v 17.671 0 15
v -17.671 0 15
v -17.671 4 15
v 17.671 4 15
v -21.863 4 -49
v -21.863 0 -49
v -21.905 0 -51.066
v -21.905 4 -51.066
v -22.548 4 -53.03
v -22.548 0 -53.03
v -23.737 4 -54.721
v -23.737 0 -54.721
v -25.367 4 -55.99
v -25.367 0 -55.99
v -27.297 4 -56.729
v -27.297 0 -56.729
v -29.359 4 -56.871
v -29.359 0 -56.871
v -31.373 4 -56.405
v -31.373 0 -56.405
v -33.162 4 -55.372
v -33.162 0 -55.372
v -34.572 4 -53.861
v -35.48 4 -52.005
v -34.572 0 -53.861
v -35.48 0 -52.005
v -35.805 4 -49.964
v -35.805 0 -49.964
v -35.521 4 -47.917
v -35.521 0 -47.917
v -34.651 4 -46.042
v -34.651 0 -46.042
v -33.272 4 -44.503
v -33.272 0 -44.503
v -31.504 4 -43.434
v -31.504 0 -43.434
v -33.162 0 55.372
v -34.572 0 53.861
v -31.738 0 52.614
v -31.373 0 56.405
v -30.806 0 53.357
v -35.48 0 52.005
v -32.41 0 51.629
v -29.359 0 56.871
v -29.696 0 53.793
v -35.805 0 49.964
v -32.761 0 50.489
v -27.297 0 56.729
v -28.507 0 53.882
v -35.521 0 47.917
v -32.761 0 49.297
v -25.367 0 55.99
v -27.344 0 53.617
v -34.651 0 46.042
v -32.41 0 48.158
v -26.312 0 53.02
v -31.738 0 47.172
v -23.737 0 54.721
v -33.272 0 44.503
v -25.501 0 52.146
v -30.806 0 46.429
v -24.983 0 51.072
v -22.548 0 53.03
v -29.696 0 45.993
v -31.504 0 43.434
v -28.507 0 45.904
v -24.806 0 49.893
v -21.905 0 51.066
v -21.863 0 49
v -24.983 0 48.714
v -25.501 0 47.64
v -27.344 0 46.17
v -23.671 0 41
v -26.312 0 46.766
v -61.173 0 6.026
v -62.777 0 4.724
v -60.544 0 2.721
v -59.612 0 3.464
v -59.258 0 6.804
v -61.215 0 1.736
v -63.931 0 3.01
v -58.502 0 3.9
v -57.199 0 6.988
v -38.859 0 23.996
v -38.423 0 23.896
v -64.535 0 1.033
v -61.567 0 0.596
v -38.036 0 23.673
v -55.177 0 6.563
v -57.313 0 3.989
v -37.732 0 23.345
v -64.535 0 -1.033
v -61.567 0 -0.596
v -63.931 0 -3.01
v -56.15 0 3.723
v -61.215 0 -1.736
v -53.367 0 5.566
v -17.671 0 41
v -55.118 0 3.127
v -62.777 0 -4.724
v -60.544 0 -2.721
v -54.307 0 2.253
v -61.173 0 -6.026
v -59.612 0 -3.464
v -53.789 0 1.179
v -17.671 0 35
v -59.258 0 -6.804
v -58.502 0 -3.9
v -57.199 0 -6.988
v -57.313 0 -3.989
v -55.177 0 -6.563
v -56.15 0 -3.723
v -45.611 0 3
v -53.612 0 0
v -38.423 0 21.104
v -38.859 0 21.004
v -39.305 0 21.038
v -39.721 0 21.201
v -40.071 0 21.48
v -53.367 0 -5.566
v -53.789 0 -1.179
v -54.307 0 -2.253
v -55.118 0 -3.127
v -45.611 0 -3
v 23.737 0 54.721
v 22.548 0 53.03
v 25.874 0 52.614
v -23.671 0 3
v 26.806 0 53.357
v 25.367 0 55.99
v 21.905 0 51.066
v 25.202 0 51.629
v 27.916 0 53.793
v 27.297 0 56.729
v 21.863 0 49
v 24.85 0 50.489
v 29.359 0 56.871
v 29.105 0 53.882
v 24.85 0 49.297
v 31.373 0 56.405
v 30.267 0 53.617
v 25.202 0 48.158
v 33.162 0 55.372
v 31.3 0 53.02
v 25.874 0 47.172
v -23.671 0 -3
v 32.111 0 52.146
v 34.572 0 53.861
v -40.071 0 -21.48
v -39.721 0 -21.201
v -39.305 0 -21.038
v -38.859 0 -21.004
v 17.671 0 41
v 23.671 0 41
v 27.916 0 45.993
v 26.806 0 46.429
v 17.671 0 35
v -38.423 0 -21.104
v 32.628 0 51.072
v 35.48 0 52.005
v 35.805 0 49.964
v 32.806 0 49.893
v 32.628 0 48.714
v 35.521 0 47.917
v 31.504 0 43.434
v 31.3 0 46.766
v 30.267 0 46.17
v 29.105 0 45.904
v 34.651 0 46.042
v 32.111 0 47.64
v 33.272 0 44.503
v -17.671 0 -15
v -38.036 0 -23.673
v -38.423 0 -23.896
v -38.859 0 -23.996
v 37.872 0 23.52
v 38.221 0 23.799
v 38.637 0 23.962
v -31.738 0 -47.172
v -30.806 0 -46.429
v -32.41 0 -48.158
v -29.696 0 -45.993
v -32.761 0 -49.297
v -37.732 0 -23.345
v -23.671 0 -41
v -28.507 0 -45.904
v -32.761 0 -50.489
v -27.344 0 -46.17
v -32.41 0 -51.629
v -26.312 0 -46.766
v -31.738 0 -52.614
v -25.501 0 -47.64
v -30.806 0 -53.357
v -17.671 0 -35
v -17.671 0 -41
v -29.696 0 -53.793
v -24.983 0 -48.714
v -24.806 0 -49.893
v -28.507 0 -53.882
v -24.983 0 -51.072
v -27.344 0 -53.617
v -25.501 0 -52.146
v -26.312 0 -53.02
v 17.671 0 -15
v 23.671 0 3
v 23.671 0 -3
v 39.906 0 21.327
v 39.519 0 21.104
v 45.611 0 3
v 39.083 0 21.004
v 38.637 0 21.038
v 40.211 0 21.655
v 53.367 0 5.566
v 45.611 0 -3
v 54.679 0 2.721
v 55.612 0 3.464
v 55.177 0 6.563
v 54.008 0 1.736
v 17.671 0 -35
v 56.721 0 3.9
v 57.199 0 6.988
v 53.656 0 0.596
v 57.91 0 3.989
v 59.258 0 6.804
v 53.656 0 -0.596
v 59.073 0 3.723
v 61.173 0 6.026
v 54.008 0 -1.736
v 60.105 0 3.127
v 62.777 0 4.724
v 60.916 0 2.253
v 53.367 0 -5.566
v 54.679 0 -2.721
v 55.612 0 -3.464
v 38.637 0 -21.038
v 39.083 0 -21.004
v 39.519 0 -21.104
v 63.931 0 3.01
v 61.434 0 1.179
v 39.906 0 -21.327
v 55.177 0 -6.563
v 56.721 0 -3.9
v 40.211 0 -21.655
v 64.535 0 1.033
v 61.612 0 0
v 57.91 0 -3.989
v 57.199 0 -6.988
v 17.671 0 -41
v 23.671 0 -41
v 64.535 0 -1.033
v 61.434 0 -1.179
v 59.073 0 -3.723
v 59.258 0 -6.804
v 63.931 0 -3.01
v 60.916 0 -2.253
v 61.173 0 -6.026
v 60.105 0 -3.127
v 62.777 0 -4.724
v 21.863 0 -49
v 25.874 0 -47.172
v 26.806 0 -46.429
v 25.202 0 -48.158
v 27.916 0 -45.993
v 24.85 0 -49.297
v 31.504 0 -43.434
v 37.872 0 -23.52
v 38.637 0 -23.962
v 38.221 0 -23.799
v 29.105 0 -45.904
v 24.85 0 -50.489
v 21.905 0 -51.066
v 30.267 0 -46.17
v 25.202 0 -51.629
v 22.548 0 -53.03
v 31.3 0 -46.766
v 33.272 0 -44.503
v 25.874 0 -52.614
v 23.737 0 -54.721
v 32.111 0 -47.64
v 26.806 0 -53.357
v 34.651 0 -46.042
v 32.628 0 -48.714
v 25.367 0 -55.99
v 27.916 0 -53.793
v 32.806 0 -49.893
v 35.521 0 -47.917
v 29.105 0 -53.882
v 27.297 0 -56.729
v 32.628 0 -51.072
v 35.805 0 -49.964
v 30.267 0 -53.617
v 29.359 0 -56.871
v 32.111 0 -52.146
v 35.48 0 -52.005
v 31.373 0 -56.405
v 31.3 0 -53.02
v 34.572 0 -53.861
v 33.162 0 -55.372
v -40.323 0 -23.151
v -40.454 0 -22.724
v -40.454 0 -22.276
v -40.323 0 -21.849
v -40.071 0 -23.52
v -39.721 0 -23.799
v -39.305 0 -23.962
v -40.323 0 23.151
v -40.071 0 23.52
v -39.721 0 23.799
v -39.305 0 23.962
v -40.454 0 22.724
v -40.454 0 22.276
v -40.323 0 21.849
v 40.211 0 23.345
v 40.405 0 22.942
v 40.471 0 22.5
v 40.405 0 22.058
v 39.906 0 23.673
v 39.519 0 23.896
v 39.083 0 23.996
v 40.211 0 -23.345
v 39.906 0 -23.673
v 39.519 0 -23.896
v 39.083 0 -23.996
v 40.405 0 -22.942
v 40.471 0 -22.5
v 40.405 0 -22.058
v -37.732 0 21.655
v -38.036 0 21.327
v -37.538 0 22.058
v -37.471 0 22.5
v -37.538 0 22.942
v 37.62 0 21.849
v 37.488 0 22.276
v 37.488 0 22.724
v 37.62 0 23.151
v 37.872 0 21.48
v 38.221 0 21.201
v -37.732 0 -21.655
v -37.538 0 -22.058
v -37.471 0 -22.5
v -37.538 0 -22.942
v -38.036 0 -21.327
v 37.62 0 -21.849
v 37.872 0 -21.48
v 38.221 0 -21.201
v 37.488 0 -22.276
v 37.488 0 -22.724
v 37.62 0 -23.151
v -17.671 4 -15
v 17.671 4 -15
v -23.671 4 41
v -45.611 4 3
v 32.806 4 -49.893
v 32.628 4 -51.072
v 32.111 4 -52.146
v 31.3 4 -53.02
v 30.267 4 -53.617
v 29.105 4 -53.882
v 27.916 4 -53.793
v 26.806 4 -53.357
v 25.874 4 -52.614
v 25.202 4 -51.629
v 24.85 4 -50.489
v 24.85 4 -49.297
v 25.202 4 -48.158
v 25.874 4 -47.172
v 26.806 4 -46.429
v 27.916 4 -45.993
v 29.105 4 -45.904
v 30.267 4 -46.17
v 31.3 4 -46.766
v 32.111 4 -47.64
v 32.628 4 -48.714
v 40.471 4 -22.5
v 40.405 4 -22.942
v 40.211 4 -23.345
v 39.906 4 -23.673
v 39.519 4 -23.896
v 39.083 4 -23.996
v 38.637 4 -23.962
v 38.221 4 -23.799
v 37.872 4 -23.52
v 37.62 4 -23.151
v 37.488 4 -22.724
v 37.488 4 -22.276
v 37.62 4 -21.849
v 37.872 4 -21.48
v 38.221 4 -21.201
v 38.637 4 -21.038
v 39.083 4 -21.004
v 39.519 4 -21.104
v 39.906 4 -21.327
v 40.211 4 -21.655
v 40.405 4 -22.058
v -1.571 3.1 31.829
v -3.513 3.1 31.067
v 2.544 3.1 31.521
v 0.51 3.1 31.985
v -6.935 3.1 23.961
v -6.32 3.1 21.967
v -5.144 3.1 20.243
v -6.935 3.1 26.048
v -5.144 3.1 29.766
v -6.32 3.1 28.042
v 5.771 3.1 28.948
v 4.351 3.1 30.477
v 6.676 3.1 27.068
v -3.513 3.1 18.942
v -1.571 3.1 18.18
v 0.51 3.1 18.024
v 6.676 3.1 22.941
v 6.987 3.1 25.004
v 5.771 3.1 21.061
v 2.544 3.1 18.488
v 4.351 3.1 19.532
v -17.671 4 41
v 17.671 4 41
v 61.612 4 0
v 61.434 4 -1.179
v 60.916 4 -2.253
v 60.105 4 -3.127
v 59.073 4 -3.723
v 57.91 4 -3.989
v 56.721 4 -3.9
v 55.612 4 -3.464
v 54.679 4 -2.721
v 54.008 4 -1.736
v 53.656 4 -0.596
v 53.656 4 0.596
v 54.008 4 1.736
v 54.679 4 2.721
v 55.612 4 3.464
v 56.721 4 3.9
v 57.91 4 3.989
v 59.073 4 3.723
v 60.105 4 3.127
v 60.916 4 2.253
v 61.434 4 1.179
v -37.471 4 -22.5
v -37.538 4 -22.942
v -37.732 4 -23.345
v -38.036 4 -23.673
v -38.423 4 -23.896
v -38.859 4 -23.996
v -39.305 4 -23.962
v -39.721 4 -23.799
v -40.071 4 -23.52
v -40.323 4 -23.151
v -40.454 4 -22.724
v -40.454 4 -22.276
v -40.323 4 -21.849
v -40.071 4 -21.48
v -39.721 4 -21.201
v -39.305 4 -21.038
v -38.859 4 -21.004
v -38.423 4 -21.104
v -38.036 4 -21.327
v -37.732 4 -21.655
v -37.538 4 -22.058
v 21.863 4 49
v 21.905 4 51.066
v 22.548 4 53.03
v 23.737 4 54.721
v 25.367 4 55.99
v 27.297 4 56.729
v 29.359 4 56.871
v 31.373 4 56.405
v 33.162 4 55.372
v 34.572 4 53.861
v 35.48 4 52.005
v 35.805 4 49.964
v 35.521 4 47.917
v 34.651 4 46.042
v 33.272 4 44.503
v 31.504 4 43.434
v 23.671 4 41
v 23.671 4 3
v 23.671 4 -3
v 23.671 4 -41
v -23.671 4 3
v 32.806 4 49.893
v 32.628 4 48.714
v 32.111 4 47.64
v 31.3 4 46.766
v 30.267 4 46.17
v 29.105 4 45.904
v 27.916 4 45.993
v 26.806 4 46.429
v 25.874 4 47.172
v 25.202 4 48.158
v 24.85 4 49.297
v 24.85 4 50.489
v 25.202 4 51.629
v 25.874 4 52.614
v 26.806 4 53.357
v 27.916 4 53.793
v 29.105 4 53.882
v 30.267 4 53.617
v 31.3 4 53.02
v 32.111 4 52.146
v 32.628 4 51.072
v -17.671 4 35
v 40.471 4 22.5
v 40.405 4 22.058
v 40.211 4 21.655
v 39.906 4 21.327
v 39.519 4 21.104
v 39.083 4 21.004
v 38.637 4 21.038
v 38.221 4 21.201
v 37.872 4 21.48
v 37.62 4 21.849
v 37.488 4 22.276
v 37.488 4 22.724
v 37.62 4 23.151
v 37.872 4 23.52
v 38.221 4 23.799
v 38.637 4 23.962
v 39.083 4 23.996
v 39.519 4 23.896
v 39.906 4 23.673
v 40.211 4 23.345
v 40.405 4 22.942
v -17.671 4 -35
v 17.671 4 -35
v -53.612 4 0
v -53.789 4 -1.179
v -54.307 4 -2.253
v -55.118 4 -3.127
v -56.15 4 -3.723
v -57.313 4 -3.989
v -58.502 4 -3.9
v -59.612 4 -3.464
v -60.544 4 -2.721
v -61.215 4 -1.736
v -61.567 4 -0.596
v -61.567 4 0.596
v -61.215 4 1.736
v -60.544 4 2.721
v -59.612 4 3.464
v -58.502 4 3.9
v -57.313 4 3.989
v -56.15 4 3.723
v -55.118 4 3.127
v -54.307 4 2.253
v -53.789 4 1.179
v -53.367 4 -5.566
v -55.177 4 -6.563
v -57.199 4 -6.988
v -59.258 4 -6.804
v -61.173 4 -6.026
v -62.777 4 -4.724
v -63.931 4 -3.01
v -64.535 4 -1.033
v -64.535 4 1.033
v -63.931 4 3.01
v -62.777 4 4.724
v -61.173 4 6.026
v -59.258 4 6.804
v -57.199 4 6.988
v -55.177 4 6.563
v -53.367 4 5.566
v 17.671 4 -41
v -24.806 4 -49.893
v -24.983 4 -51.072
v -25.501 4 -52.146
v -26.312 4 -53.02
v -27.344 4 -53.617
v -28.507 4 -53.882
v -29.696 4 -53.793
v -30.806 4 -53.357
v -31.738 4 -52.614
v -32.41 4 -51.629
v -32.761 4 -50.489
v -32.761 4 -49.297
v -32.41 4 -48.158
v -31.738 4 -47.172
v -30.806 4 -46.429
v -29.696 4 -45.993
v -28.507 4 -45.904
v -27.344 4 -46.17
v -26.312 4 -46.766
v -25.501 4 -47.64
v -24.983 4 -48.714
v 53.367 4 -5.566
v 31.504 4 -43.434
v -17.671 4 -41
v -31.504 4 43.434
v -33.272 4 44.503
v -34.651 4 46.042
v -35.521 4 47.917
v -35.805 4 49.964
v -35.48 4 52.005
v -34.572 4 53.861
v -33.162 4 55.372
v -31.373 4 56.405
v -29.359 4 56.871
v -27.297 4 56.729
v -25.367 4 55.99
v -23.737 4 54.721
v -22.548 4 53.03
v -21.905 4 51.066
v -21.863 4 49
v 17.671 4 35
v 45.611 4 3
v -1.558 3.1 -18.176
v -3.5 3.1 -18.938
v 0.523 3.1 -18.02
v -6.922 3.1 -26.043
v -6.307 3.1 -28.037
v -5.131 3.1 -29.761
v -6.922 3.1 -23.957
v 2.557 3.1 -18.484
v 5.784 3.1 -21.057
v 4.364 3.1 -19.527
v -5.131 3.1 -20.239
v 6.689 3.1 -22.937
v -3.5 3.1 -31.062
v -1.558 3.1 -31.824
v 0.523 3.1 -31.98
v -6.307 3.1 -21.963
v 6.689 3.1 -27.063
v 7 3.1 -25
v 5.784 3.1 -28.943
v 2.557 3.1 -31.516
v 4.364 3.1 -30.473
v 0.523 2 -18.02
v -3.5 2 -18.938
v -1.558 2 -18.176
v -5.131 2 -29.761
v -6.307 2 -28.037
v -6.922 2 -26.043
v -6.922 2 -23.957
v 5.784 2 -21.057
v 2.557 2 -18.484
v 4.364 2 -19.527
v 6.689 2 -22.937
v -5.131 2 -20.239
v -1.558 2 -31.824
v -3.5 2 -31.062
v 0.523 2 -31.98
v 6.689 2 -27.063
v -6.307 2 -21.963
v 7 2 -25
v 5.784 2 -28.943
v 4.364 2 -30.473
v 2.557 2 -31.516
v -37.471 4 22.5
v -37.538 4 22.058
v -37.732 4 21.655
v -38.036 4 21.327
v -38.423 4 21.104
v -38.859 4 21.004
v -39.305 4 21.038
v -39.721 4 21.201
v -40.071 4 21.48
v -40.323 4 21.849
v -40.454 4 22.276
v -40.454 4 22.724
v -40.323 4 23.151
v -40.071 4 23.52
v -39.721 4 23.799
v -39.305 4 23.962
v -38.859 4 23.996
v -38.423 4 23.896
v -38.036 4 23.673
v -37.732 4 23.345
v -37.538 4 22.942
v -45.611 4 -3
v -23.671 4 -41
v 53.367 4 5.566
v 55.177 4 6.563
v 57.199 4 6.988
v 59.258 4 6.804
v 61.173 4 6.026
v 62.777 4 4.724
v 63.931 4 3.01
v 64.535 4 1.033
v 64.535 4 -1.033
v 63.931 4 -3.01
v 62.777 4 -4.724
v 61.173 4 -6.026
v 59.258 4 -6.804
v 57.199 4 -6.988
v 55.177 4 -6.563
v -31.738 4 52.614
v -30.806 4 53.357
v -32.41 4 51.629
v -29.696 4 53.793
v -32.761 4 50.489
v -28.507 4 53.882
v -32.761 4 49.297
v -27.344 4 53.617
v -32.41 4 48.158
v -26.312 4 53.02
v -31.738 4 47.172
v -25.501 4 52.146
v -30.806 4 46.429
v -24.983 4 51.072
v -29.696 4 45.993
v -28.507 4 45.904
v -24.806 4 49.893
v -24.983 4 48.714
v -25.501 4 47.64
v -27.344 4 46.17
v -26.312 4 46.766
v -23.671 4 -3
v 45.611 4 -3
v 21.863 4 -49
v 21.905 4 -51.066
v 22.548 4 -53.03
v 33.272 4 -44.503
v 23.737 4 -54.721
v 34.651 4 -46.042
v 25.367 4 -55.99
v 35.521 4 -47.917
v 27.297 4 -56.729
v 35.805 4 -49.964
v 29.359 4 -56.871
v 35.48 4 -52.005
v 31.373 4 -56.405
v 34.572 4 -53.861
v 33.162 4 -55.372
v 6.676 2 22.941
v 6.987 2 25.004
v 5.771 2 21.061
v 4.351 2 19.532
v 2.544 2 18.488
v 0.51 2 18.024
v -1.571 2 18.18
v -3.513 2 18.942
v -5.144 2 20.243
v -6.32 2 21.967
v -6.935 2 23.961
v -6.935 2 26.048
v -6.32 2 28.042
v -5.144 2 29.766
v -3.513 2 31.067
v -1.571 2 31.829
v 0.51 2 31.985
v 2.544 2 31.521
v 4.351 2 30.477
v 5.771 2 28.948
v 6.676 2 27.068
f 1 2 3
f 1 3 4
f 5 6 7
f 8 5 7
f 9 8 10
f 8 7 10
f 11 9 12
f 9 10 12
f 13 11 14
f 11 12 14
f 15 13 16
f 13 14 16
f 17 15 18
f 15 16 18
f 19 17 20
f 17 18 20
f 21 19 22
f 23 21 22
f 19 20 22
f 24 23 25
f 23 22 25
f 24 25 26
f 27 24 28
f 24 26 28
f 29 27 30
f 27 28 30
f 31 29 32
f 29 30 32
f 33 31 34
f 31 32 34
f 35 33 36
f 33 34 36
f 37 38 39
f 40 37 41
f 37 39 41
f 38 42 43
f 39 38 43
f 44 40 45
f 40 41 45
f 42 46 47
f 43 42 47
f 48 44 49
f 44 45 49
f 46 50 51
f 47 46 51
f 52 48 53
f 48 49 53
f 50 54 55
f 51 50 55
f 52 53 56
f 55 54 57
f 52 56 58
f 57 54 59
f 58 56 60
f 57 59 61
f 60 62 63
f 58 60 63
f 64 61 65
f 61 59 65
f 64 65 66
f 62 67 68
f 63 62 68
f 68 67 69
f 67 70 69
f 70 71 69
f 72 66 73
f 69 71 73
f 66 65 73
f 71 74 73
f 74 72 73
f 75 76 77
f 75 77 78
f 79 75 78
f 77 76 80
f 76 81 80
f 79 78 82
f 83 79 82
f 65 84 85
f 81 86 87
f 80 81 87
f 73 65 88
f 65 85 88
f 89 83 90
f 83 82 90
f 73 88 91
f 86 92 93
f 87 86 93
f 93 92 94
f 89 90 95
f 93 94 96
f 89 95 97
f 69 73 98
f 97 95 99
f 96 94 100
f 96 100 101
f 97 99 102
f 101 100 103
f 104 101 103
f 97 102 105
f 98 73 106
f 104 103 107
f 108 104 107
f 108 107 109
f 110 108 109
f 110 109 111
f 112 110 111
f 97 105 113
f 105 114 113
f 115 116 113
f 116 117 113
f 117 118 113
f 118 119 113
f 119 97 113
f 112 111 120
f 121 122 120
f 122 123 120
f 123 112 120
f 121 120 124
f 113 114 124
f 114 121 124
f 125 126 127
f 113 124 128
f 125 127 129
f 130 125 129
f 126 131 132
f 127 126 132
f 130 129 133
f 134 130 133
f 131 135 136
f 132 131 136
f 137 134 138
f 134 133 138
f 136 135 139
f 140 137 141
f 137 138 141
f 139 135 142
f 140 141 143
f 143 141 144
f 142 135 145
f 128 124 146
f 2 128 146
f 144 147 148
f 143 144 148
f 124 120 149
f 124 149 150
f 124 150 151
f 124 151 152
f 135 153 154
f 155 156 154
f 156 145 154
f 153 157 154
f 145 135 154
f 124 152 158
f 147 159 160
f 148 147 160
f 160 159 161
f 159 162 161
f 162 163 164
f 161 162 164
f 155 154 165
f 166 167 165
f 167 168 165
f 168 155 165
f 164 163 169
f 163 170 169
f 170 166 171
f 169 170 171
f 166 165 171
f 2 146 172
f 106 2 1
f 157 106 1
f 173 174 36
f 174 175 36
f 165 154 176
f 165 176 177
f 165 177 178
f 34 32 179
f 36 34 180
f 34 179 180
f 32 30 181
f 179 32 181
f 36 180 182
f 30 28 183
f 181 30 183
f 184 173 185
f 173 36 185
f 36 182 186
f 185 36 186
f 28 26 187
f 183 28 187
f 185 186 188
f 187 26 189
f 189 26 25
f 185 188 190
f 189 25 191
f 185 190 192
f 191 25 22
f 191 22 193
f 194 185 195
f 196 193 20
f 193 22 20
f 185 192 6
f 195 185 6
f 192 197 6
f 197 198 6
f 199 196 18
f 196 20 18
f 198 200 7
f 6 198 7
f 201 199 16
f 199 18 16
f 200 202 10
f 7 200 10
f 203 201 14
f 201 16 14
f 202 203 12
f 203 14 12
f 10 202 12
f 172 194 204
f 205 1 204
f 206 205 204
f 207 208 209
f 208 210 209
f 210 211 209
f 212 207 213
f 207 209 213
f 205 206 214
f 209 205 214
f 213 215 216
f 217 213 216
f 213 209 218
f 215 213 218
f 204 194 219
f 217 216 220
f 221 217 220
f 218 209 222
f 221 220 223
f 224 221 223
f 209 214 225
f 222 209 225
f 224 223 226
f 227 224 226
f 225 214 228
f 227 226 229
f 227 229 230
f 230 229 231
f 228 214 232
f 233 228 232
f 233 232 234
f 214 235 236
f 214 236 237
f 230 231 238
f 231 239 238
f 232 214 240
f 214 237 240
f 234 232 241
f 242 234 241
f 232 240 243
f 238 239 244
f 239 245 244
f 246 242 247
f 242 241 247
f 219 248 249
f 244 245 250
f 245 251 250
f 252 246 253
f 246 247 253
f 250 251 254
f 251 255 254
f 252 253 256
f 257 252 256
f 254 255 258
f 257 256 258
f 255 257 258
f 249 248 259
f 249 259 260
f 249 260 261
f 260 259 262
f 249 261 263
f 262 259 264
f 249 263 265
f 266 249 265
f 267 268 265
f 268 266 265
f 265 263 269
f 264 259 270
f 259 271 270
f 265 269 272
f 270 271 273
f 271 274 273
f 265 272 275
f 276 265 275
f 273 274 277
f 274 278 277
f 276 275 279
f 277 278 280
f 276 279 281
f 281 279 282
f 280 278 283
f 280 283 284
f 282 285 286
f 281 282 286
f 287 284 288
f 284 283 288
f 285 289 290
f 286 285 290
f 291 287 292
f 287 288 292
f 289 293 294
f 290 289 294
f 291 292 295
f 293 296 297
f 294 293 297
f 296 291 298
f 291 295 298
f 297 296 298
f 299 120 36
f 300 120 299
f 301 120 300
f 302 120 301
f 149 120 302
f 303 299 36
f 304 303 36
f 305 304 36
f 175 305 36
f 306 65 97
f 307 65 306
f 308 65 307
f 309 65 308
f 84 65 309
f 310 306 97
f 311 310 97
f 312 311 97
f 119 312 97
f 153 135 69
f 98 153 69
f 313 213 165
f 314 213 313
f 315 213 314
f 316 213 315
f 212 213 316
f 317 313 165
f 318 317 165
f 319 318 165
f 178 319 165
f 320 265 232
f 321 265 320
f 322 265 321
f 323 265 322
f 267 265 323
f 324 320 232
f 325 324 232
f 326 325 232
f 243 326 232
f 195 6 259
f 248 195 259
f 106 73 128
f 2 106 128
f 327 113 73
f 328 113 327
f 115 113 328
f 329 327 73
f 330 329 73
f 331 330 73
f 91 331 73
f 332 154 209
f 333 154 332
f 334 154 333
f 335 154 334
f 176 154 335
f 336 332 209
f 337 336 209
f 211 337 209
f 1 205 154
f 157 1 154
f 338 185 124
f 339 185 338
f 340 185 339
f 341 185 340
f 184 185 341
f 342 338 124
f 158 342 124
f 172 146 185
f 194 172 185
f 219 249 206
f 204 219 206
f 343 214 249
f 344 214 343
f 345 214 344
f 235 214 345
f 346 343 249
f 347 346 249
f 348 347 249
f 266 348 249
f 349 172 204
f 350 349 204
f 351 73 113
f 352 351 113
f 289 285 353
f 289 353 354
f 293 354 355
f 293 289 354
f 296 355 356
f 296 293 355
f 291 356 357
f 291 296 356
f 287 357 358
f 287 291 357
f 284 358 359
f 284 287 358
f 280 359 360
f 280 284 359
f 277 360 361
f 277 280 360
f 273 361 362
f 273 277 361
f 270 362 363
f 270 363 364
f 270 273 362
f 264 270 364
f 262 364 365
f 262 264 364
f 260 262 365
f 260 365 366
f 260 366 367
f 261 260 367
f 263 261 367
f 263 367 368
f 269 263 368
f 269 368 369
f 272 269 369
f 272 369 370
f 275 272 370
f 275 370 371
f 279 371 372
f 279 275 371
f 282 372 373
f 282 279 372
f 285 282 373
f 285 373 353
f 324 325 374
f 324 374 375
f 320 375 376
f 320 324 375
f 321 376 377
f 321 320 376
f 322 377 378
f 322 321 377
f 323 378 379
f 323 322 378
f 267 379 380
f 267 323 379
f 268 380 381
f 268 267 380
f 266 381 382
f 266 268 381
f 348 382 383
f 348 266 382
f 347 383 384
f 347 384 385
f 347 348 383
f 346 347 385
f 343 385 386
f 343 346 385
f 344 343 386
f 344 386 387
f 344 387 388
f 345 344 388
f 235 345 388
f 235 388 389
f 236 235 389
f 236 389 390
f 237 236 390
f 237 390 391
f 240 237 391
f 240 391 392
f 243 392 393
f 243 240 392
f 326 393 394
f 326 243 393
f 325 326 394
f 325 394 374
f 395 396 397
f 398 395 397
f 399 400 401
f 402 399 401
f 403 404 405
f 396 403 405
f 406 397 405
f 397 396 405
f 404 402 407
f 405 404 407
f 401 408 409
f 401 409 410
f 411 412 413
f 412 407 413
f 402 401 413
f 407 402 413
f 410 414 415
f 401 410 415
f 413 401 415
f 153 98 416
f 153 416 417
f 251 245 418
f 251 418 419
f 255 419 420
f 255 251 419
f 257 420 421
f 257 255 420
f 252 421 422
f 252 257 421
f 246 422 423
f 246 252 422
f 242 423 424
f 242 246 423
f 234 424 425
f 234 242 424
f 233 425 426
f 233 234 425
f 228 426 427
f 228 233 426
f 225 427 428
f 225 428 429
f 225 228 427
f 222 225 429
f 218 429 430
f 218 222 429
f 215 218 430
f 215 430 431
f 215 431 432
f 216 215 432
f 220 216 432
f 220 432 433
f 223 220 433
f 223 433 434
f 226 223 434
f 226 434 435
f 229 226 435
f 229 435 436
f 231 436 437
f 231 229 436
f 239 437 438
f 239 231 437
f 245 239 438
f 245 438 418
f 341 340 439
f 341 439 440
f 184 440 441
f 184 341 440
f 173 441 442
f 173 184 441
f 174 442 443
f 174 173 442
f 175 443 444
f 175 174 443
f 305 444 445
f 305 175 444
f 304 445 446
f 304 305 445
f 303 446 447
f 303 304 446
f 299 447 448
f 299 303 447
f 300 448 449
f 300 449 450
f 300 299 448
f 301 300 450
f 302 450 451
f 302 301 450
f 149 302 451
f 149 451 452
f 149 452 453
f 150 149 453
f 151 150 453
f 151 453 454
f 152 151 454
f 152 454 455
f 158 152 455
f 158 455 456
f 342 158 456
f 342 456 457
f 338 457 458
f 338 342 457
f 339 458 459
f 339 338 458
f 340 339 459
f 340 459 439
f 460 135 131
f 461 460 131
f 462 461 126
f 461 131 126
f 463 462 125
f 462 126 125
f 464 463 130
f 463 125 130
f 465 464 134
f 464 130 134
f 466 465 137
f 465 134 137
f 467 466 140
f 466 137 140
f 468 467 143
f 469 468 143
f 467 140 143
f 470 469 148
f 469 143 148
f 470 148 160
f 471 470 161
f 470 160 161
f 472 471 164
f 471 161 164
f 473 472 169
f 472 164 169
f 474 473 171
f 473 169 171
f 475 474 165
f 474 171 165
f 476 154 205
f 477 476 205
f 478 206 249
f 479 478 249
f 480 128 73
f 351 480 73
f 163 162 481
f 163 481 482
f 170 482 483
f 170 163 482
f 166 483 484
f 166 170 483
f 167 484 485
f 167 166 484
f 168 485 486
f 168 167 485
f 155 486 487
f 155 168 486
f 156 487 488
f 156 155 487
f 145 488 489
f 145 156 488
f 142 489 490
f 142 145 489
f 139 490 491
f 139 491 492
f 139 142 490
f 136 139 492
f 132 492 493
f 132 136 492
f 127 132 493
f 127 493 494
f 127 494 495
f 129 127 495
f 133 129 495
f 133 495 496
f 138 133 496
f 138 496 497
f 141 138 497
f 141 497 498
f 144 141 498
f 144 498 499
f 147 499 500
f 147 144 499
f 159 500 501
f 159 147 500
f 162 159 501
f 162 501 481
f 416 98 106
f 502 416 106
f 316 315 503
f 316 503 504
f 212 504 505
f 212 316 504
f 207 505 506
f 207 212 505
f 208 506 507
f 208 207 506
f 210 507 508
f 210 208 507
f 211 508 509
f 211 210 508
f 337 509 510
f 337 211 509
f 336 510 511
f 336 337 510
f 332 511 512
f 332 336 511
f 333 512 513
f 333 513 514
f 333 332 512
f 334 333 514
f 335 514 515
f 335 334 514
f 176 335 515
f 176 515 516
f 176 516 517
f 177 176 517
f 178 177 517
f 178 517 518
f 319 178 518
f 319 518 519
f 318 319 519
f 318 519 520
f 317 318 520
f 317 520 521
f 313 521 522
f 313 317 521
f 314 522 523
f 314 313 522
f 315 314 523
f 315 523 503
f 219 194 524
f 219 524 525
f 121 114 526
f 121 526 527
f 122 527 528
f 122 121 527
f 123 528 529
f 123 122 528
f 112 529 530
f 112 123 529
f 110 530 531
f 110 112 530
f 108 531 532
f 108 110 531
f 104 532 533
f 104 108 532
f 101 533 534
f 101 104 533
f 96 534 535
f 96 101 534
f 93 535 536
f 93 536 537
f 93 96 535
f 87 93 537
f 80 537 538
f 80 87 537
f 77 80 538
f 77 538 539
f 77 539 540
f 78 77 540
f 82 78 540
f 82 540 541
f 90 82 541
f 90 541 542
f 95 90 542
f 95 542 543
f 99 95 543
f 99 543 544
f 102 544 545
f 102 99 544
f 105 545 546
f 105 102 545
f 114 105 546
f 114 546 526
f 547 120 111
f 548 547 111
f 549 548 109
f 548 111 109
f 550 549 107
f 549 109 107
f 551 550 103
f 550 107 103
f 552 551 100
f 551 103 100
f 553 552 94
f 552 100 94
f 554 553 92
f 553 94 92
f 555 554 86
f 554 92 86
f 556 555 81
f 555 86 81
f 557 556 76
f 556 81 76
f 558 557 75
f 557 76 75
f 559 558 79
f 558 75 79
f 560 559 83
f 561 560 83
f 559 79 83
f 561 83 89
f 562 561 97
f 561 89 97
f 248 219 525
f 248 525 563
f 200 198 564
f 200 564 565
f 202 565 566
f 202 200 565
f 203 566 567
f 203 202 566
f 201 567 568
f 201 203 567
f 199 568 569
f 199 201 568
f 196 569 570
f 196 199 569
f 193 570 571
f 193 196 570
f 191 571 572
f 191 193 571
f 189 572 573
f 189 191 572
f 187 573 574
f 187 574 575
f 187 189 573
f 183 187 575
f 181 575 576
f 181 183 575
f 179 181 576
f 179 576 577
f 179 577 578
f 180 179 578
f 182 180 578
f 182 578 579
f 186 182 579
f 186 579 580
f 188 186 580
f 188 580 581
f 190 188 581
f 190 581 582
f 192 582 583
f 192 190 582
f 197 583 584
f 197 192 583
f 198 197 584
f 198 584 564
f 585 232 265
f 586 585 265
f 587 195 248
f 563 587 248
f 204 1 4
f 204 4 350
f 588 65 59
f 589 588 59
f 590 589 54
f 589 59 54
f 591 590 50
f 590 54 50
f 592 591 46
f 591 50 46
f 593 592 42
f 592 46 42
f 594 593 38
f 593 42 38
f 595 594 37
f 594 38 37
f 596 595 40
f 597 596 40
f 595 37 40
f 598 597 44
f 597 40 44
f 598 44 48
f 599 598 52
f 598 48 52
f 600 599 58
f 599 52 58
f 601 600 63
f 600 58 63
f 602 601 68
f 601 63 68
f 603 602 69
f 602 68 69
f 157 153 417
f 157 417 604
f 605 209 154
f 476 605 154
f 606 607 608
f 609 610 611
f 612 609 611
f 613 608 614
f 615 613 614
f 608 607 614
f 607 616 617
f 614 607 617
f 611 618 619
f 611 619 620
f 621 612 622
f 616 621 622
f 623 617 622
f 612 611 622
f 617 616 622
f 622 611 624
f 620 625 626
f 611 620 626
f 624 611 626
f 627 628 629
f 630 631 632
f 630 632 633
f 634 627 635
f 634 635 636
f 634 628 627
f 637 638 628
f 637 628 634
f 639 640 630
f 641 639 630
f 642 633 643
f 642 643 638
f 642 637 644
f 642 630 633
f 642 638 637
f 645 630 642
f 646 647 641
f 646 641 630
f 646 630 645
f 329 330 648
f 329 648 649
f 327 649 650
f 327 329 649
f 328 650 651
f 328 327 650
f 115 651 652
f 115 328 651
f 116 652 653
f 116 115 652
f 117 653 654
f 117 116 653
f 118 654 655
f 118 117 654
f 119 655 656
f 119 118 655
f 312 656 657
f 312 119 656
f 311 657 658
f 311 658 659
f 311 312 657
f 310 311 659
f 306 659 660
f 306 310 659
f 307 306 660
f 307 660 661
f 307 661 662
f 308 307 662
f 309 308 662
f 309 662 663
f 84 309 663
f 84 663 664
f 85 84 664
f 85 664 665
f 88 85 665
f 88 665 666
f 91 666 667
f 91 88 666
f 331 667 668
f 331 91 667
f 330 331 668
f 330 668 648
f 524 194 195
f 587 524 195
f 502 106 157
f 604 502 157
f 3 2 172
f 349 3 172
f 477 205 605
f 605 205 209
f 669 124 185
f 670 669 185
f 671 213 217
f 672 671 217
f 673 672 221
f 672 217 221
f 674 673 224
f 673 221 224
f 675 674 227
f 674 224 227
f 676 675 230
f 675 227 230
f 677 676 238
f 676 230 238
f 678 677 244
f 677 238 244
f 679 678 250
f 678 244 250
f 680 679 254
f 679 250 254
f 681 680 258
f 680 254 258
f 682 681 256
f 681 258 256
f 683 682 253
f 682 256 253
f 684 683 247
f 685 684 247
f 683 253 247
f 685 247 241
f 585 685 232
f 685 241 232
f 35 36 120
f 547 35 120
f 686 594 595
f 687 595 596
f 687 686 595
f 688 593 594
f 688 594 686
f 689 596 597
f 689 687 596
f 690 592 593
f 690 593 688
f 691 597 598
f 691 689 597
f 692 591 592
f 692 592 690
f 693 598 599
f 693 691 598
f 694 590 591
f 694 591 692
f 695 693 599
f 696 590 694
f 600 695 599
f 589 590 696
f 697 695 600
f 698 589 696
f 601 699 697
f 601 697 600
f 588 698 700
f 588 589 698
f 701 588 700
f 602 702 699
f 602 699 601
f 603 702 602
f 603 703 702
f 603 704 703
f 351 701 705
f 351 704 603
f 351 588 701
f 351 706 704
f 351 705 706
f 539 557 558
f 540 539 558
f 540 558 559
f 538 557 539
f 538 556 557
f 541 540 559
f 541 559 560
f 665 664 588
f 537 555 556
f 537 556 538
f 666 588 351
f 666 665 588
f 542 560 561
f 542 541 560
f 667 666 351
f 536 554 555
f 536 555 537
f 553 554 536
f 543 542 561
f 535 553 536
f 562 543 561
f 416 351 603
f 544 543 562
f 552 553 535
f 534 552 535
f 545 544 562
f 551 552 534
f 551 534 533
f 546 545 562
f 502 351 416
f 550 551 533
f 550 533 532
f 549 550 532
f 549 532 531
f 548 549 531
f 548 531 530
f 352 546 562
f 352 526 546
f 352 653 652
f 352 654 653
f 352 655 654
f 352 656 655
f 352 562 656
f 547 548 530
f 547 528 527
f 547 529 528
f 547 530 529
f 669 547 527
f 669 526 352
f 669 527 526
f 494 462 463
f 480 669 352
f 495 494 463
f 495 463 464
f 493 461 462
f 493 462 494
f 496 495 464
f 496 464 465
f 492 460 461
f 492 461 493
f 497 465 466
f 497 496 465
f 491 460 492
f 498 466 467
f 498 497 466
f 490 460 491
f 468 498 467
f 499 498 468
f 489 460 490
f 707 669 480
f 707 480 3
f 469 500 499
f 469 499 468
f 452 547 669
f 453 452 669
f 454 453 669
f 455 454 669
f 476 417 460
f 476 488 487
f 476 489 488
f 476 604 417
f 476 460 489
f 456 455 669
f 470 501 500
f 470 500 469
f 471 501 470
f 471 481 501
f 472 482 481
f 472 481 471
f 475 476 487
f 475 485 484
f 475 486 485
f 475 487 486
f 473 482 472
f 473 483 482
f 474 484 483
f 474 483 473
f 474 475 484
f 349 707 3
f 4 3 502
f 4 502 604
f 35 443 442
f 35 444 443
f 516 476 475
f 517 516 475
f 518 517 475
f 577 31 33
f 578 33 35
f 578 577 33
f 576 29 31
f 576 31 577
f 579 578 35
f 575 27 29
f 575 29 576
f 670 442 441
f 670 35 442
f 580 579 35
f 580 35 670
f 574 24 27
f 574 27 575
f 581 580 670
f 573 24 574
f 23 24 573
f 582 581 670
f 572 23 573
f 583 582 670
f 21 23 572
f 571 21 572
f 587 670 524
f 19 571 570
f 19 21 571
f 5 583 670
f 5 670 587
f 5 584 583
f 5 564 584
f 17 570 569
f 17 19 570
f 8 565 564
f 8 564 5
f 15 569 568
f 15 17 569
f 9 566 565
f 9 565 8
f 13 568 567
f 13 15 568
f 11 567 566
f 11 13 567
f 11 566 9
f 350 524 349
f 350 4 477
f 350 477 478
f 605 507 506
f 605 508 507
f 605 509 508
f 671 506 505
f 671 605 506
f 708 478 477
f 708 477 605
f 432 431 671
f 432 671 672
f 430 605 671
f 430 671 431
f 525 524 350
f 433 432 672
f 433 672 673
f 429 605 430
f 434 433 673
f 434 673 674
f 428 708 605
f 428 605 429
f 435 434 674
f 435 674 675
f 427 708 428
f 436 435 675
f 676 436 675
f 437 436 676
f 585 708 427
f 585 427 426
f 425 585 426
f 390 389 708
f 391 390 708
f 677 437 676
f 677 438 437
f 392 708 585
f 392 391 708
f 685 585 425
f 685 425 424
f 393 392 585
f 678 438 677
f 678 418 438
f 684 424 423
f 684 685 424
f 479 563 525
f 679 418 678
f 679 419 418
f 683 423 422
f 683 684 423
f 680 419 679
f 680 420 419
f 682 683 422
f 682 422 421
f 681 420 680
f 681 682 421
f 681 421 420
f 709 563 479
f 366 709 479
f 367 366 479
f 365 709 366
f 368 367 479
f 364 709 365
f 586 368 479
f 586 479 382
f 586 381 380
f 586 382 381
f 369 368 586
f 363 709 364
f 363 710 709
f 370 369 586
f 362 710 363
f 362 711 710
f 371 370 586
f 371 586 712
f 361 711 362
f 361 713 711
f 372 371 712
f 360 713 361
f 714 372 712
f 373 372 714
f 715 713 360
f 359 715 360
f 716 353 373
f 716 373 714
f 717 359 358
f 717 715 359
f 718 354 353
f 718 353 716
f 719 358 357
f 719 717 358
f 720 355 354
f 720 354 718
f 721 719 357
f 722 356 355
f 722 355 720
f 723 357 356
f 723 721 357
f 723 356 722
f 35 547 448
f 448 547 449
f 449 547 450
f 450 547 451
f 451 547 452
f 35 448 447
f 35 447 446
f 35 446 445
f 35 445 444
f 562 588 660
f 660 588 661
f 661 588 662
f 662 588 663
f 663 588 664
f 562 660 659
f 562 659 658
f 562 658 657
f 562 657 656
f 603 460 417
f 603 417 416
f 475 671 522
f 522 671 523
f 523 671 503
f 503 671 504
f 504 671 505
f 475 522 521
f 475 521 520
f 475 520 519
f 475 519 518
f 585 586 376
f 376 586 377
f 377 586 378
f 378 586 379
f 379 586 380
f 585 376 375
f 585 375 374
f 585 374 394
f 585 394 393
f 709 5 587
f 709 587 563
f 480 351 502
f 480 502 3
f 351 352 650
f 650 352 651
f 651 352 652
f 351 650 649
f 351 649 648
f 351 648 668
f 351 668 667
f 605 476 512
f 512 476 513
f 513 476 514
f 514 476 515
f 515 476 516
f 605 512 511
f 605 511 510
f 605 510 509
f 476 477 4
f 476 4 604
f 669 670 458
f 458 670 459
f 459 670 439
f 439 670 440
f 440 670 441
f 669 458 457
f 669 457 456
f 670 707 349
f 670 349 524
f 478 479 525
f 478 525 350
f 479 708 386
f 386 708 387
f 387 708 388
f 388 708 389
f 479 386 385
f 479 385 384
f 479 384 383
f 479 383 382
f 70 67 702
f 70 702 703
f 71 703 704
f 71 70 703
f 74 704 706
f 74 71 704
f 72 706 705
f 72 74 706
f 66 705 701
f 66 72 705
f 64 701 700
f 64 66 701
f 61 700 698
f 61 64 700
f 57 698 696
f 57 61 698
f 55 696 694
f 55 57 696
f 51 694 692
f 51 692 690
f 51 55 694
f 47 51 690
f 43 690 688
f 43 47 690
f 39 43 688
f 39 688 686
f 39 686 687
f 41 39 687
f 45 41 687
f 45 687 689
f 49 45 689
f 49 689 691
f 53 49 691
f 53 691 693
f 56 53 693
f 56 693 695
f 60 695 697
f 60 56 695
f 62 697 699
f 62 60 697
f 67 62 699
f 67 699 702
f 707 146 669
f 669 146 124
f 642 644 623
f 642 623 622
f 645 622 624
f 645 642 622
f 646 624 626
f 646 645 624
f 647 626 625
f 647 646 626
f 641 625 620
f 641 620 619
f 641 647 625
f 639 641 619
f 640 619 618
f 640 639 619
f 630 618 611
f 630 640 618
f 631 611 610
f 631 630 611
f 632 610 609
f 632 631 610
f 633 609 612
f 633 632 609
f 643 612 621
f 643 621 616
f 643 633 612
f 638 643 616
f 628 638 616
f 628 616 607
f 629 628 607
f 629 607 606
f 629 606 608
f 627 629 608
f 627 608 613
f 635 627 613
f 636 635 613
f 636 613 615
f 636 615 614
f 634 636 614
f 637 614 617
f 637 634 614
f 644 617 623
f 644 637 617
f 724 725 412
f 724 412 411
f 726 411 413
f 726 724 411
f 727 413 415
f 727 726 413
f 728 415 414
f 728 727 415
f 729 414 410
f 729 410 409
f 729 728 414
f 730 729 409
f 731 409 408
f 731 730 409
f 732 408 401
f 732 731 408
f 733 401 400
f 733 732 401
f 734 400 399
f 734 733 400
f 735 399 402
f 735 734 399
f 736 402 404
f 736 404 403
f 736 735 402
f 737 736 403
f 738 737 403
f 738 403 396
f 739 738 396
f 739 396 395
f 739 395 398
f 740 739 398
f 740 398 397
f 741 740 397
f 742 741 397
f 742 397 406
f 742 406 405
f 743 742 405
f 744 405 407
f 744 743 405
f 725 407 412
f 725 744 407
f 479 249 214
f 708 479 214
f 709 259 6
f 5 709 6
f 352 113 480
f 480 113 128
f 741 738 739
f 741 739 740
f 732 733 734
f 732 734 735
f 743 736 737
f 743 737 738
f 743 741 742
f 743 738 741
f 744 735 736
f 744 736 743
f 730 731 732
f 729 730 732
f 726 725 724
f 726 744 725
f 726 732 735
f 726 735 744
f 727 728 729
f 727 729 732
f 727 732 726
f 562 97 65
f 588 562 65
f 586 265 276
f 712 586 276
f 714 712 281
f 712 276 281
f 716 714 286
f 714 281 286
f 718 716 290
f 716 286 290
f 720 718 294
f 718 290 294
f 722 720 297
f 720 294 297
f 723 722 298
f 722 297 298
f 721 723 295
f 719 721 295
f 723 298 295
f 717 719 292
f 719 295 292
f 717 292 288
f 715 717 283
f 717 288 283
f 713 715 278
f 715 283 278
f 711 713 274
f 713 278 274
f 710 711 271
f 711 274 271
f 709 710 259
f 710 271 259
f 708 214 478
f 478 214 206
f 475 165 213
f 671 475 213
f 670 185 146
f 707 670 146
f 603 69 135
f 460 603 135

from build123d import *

# Parameters (mm, degrees)
SKETCH_1_R          = 4
SKETCH_1_R_2        = 1.5
SKETCH_1_W          = 35.342722074
SKETCH_1_H          = 6
SKETCH_1_H_2        = 30
EXTRUDE_1_DEPTH     = 4
CUT_EXTRUDE_START   = -2
SKETCH_2_R          = 7
CUT_EXTRUDE_1_DEPTH = 1.1


with BuildPart() as part:
    # 草图1 → 凸台-拉伸1 (new body)
    with BuildSketch(Plane(origin=(0, 0, 0), x_dir=(1, 0, 0), z_dir=(0, 1, 0))):
        with BuildLine():
            ThreePointArc((-21.862962012, 49), (-32.305762114, 55.955221358), (-31.503763779, 43.433880504))
            Line((-31.503763779, 43.433880504), (-53.366725791, 5.566119496))
            ThreePointArc((-53.366725791, 5.566119496), (-64.611524227, 0), (-53.366725791, -5.566119496))
            Line((-53.366725791, -5.566119496), (-31.503763779, -43.433880504))
            ThreePointArc((-31.503763779, -43.433880504), (-32.305762114, -55.955221358), (-21.862962012, -49))
            Line((-21.862962012, -49), (21.862962012, -49))
            ThreePointArc((21.862962012, -49), (32.305762114, -55.955221358), (31.503763779, -43.433880504))
            Line((31.503763779, -43.433880504), (53.366725791, -5.566119496))
            ThreePointArc((53.366725791, -5.566119496), (64.611524227, 0), (53.366725791, 5.566119496))
            Line((53.366725791, 5.566119496), (31.503763779, 43.433880504))
            ThreePointArc((31.503763779, 43.433880504), (32.305762114, 55.955221358), (21.862962012, 49))
            Line((21.862962012, 49), (-21.862962012, 49))
        make_face()
        with Locations((-28.805762114, 49.893043531)):
            Circle(SKETCH_1_R, mode=Mode.SUBTRACT)
        with Locations((28.805762114, -49.893043531)):
            Circle(SKETCH_1_R, mode=Mode.SUBTRACT)
        with Locations((-28.805762114, -49.893043531)):
            Circle(SKETCH_1_R, mode=Mode.SUBTRACT)
        with Locations((-57.611524227, 0)):
            Circle(SKETCH_1_R, mode=Mode.SUBTRACT)
        with Locations((38.97114317, 22.5)):
            Circle(SKETCH_1_R_2, mode=Mode.SUBTRACT)
        with Locations((-38.97114317, -22.5)):
            Circle(SKETCH_1_R_2, mode=Mode.SUBTRACT)
        with Locations((0, 38)):
            Rectangle(SKETCH_1_W, SKETCH_1_H, mode=Mode.SUBTRACT)
        Rectangle(SKETCH_1_W, SKETCH_1_H_2, mode=Mode.SUBTRACT)
        with Locations((0, -38)):
            Rectangle(SKETCH_1_W, SKETCH_1_H, mode=Mode.SUBTRACT)
        Polygon((23.671361037, 41), (45.610671266, 3), (23.671361037, 3), align=None, mode=Mode.SUBTRACT)
        Polygon((45.610671266, -3), (23.671361037, -41), (23.671361037, -3), align=None, mode=Mode.SUBTRACT)
        Polygon((-23.671361037, -41), (-45.610671266, -3), (-23.671361037, -3), align=None, mode=Mode.SUBTRACT)
        Polygon((-45.610671266, 3), (-23.671361037, 41), (-23.671361037, 3), align=None, mode=Mode.SUBTRACT)
        with Locations((38.97114317, -22.5)):
            Circle(SKETCH_1_R_2, mode=Mode.SUBTRACT)
        with Locations((-38.97114317, 22.5)):
            Circle(SKETCH_1_R_2, mode=Mode.SUBTRACT)
        with Locations((28.805762114, 49.893043531)):
            Circle(SKETCH_1_R, mode=Mode.SUBTRACT)
        with Locations((57.611524227, 0)):
            Circle(SKETCH_1_R, mode=Mode.SUBTRACT)
    extrude(amount=EXTRUDE_1_DEPTH)

    # 草图2 → 切除-拉伸1 (cut)
    with BuildSketch(Plane(origin=(0, 4, 0), x_dir=(1, 0, 0), z_dir=(0, 1, 0)).offset(CUT_EXTRUDE_START)):
        with Locations((0, 25)):
            Circle(SKETCH_2_R)
        with Locations((-0.013100305, -25.004400745)):
            Circle(SKETCH_2_R)
    extrude(amount=CUT_EXTRUDE_1_DEPTH, mode=Mode.SUBTRACT)


solid = part.part
